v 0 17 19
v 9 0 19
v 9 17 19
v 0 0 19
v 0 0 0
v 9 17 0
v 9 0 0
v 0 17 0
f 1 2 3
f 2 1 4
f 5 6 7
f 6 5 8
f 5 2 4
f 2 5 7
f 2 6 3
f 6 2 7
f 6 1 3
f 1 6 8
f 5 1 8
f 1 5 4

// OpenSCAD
// Generated by SolidPython 1.0.1 on 2020-07-29 00:39:26


cube(size = [9, 17, 19]);
/***********************************************
*********      SolidPython code:      **********
************************************************
 
# import packages: SolidPython
from solid import *
from solid.utils import *
from itertools import chain, combinations


class Resize:

    def __init__(self, scad_file):
        self.scad_file = scad_file
        #self.scad_file = import_scad(scad_file)
        # cone/cylinder param:
        self.r1 = 0
        self.r2 = 0
        self.h = 0
        # rectangular prism param:
        self.w = 0
        self.l = 0
        # ellipse param:
        self.r = 0

    # import OpenScad code (file name corresponds to shape)


    # classify shape + parameters
    def assign(self, param1, param2, param3):
        if self.scad_file == 'cone.scad':
            self.r1 = param1
            self.r2 = param2
            self.h = param3
        elif self.scad_file == 'cylinder.scad':
            self.r1 = param1
            self.r2 = param2
            self.h = param3
        elif self.scad_file == 'rectangularPrism.scad':
            self.h = param1
            self.l = param2
            self.w = param3
        else:
            self.r = param1
            self.h = param2

    # resize parameters
    def iterate(self):
        x = range(3, 20, 2)
        i = 1
        if self.scad_file == 'cone.scad':
            tempList = list(combinations(x, 2))
            for temp in tempList:
                param1 = temp[0]
                param2 = temp[1]
                filepath = 'produced_scad_files/' + 'cone' + str(param1) + '_' + str(param2) + '_' + '.scad'
                scad_render_to_file(cylinder(h=param1, r1=param2, r2=0), filepath)

        elif self.scad_file == 'cylinder.scad':
            tempList = list(combinations(x, 3))
            for temp in tempList:
                param1 = temp[0]
                param2 = temp[1]
                filepath = 'produced_scad_files/' + 'cylinder' + str(param1) + '_' + str(param2) + '_' + '.scad'
                scad_render_to_file(cylinder(h=param1, r1=param2, r2=param2), filepath)

        elif self.scad_file == 'rectangularPrism.scad':
            tempList = list(combinations(x, 3))
            for temp in tempList:
                param1 = temp[0]
                param2 = temp[1]
                param3 = temp[2]
                filepath = 'produced_scad_files/' + 'rectangularPrism' + str(param1) + '_' + str(param2) + '_' + str(
                    param3) + '.scad'
                scad_render_to_file(cube(size=(param1, param2, param3)), filepath)

        elif self.scad_file == 'ellipse.scad':
            tempList = list(combinations(x, 4))
            for temp in tempList:
                param1 = temp[0]
                param2 = temp[1]
                param3 = temp[2]
                param4 = temp[3]
                filepath = 'produced_scad_files/' + 'ellipse' + str(param1) + '_' + str(param2) + '_' + str(param3) + '_' + str(param4) + '.scad'
                scad_render_to_file(scale([param1, param2, param3])(sphere(r=param4)), filepath)

    def render_to_scadfile(self):
        scad_render_to_file(scad, 'example.scad') 
 
************************************************/
